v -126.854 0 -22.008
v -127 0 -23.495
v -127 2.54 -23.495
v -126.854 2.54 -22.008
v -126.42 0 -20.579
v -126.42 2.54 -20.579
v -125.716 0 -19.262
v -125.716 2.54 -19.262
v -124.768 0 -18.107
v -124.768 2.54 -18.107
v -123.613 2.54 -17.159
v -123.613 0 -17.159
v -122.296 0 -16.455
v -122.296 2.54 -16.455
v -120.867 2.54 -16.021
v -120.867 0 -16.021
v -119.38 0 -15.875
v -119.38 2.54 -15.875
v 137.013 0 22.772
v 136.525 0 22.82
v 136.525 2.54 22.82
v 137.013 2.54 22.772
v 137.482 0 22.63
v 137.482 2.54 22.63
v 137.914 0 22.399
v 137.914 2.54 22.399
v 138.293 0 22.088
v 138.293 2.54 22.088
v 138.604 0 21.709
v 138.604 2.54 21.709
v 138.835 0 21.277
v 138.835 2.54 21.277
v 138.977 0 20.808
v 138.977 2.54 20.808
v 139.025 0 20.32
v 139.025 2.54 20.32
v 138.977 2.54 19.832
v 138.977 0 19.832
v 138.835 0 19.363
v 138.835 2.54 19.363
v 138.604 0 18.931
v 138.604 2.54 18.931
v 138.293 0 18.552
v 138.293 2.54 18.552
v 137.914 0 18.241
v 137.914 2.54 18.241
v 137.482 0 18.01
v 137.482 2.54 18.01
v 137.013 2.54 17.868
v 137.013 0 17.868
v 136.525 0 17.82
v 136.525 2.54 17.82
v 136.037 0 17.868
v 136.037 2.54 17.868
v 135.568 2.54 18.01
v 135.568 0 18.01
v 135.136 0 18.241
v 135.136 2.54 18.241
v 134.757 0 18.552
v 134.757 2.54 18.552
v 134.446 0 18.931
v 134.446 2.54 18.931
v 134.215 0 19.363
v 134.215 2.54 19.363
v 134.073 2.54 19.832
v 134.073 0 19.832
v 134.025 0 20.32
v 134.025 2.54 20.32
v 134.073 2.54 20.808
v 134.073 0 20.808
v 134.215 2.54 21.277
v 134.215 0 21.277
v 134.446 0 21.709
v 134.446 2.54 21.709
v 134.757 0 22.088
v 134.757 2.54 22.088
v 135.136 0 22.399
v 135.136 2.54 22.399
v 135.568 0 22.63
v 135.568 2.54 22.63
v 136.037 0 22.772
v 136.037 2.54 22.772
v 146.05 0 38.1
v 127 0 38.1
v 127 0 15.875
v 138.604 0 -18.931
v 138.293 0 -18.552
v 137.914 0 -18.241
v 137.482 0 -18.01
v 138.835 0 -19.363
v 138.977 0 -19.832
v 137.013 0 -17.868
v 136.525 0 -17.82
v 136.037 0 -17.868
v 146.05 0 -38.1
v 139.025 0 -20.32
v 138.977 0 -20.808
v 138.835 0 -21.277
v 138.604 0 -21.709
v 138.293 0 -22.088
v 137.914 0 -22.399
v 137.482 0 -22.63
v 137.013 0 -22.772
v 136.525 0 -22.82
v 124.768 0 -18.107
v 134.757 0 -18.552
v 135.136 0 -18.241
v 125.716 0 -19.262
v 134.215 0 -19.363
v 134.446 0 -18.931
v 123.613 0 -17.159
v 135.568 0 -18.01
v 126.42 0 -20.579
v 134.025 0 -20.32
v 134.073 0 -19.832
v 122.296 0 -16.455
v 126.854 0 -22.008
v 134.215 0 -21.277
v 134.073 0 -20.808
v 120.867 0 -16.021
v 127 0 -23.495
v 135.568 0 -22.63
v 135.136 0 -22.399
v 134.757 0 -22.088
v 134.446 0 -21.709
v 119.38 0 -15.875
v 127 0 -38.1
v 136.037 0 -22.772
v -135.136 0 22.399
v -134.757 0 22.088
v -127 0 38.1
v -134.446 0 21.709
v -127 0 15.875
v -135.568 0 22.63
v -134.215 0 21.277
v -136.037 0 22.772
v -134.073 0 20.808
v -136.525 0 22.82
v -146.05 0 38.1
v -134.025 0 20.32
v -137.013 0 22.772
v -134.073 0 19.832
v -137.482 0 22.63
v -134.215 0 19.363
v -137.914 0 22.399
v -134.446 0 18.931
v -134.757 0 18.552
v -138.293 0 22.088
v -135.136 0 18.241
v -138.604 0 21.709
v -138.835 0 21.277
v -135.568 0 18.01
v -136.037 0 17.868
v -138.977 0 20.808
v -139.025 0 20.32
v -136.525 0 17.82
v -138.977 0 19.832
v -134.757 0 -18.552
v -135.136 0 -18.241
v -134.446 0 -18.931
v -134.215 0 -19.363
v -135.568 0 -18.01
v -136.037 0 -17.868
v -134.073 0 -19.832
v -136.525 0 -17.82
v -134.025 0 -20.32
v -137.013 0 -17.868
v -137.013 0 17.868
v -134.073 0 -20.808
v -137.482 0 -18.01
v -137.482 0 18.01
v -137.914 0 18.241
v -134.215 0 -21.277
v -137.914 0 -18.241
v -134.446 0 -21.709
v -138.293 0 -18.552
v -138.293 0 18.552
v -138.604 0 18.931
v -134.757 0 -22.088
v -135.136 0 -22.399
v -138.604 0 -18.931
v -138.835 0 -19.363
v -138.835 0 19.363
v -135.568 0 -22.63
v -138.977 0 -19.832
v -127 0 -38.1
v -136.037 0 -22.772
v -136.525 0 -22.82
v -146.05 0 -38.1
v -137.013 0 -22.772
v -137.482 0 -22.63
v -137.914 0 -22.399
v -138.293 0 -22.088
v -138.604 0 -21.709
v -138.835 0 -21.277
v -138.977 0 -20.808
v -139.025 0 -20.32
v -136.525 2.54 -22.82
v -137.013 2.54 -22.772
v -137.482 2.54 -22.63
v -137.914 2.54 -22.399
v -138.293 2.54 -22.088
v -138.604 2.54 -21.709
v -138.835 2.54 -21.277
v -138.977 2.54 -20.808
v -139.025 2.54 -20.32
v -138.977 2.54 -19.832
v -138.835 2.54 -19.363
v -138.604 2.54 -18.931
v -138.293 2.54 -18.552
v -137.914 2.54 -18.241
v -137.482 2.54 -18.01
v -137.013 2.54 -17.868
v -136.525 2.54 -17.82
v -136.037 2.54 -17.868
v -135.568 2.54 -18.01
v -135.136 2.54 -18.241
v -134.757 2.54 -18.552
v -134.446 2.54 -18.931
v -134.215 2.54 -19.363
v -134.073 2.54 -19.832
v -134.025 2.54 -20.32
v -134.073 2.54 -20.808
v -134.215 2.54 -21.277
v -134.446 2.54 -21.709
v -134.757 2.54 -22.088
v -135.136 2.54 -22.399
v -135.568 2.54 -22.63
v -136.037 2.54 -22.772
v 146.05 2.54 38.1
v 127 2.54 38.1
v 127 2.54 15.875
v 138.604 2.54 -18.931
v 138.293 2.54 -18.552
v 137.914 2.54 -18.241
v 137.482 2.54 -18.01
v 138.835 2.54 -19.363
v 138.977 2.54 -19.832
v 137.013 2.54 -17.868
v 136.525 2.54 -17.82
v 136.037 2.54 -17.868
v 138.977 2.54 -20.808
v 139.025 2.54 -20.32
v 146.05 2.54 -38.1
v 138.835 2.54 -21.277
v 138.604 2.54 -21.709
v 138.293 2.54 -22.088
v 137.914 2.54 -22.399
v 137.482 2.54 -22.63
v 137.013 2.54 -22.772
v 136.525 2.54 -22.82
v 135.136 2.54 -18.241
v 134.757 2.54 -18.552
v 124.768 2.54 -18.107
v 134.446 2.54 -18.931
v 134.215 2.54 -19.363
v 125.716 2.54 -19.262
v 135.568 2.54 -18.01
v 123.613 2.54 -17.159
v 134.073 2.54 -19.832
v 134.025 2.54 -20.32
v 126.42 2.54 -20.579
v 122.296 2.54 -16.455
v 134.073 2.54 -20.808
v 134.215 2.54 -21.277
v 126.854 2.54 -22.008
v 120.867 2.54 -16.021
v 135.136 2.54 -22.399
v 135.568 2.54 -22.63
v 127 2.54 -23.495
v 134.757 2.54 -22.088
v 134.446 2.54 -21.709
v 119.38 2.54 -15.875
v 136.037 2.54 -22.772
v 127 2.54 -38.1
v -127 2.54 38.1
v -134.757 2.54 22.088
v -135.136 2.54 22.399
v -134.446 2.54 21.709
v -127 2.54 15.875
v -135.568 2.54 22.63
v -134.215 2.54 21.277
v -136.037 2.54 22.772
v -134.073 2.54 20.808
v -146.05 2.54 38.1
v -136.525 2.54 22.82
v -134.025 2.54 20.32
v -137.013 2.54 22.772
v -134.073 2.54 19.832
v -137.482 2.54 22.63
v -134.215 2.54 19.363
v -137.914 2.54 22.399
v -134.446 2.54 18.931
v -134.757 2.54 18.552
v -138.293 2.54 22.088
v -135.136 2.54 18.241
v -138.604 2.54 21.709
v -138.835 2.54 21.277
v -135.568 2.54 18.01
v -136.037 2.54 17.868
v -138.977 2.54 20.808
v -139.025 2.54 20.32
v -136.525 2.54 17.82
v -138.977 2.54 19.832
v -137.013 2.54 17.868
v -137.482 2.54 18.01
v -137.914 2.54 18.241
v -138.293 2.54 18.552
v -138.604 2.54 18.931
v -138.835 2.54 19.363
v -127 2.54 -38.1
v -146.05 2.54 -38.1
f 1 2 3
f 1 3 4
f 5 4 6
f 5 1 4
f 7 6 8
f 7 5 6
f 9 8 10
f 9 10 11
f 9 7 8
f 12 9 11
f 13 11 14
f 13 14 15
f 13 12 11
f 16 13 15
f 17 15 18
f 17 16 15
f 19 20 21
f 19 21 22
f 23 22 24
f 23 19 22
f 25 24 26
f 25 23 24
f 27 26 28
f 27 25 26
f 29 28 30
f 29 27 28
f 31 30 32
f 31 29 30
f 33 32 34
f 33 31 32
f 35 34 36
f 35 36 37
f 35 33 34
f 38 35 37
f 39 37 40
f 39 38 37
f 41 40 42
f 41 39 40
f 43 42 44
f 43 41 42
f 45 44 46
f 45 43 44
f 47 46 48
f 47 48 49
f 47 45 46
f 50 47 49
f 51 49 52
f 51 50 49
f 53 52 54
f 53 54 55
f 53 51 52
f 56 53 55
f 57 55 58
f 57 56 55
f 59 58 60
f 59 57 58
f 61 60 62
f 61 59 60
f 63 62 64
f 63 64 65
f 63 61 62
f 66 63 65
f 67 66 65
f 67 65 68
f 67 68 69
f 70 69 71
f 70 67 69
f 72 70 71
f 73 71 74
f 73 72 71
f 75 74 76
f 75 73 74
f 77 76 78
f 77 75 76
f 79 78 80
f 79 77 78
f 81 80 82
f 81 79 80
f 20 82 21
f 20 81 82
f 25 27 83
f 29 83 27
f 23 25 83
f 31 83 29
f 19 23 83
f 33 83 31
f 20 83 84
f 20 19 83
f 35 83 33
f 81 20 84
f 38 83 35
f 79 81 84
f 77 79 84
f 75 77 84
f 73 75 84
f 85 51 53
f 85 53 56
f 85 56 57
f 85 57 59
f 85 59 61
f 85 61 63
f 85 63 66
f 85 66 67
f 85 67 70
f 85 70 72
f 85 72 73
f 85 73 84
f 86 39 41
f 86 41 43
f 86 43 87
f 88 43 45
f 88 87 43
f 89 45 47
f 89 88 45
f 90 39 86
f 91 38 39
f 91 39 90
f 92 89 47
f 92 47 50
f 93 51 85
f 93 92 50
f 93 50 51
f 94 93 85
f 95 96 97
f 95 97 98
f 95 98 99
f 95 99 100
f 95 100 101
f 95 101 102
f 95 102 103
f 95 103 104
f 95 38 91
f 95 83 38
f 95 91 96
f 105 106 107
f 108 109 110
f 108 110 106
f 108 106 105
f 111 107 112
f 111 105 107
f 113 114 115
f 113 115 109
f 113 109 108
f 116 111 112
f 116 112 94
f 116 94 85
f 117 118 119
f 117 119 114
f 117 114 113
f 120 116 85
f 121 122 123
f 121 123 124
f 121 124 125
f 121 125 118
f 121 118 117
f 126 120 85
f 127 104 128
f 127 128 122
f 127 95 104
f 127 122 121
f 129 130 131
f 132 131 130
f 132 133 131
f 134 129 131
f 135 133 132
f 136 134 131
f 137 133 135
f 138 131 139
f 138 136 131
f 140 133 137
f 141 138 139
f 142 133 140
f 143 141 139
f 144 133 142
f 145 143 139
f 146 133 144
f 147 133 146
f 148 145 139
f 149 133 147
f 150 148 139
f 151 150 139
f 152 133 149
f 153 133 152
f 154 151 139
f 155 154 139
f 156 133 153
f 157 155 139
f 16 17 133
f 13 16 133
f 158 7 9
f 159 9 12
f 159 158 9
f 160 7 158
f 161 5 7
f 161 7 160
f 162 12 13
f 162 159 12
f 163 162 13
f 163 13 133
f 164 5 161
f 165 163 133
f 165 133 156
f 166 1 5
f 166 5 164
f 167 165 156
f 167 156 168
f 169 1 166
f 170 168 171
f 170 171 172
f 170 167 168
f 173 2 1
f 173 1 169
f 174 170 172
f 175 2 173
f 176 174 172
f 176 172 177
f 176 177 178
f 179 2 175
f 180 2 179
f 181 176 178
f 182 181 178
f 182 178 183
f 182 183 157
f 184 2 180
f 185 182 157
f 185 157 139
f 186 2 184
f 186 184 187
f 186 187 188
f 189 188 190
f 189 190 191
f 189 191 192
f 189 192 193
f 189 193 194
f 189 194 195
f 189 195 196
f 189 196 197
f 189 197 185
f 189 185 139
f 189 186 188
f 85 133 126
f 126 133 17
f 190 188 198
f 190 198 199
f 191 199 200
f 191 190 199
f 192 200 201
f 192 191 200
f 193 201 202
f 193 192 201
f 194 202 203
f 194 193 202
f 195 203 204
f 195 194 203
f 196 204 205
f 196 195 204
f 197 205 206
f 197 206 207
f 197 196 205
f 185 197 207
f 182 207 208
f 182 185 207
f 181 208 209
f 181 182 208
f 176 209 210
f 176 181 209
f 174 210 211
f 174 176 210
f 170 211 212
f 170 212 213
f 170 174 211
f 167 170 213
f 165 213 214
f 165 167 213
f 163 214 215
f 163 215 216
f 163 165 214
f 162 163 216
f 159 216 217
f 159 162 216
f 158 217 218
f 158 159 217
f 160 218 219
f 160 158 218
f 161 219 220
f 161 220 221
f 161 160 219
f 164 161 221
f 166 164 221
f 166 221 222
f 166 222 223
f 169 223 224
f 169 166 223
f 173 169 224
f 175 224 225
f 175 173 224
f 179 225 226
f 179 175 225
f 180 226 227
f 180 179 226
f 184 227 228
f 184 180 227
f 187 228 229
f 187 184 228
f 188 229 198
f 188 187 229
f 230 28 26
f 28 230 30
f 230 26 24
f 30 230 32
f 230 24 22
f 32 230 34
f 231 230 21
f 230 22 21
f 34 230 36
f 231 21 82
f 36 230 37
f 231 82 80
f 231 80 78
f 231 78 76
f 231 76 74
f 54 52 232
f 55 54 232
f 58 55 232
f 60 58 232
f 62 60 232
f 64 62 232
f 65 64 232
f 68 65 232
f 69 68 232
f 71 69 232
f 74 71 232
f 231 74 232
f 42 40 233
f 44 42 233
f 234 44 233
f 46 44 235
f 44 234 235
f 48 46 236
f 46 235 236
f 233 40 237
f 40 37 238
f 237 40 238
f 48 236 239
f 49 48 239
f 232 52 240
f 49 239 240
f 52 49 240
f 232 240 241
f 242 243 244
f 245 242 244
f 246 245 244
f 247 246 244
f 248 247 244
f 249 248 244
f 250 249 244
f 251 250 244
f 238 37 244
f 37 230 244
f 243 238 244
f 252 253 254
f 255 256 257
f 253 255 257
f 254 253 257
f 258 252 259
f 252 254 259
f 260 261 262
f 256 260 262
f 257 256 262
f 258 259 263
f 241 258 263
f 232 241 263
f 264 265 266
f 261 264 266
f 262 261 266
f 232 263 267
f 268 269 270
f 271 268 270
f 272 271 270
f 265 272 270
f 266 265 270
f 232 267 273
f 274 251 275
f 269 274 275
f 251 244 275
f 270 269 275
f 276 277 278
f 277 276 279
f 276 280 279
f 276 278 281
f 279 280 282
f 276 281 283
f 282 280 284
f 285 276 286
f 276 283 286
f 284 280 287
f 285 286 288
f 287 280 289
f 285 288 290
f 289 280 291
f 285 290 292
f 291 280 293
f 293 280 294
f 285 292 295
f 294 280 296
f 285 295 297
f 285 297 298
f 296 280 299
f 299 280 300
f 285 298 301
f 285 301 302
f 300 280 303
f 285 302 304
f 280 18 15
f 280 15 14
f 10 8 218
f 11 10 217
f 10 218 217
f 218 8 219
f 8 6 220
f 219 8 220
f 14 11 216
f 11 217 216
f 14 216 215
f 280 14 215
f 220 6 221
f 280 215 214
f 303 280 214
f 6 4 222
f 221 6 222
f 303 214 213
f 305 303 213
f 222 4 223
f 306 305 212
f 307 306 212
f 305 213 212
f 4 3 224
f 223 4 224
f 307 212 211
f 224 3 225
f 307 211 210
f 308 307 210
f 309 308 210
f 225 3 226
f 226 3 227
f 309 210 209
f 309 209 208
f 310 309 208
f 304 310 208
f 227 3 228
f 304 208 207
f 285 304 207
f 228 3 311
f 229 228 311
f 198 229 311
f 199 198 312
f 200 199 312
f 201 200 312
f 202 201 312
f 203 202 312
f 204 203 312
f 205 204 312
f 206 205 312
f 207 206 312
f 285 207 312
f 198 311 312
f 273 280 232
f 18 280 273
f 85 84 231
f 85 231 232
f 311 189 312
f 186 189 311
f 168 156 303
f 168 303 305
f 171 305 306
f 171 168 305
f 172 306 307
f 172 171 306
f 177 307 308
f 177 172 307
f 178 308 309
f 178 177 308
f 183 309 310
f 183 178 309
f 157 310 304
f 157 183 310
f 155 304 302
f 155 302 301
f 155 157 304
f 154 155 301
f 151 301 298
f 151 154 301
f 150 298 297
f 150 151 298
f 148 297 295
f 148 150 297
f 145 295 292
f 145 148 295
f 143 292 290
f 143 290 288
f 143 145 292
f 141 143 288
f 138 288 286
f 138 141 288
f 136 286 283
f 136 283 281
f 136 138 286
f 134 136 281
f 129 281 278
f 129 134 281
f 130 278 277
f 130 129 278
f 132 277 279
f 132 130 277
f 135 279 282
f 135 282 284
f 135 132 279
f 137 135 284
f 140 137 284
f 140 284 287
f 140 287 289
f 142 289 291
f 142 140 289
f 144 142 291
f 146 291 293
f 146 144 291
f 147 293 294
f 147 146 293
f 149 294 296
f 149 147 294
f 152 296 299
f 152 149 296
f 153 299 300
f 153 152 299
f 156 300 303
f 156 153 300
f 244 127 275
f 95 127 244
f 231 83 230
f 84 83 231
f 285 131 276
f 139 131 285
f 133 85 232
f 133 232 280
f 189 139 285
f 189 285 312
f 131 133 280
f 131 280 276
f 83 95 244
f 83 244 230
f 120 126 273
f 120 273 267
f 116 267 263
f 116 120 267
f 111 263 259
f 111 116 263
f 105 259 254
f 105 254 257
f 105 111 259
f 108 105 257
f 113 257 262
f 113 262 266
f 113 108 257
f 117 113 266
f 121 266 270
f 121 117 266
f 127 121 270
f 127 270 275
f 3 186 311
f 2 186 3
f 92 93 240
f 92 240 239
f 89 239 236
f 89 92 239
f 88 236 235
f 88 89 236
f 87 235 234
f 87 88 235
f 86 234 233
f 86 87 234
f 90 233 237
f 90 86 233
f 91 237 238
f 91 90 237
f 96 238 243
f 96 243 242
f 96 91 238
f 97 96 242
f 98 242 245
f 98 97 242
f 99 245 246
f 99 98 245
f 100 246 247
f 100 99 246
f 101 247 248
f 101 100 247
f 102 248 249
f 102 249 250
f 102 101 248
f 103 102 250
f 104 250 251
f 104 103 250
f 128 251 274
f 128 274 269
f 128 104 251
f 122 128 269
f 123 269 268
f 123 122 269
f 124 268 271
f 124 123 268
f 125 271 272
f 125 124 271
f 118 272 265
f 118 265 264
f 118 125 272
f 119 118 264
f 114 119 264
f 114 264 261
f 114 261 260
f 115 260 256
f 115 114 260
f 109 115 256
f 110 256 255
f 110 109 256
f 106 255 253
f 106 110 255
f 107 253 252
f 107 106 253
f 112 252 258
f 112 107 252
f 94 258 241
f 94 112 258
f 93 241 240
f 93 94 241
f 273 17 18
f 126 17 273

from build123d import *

# Parameters (mm, degrees)
SKETCH1_R           = 2.5
BOSS_EXTRUDE1_DEPTH = 2.54


with BuildPart() as part:
    # Sketch1 → Boss-Extrude1 (new body)
    with BuildSketch(Plane(origin=(0, 0, 0), x_dir=(1, 0, 0), z_dir=(0, 1, 0))):
        with BuildLine():
            Line((-127, 38.1), (-127, 23.495))
            ThreePointArc((-127, 23.495), (-124.768153673, 18.106846327), (-119.38, 15.875))
            Line((-119.38, 15.875), (119.38, 15.875))
            ThreePointArc((119.38, 15.875), (124.768153673, 18.106846327), (127, 23.495))
            Line((127, 23.495), (127, 38.1))
            Line((127, 38.1), (146.05, 38.1))
            Line((146.05, 38.1), (146.05, -38.1))
            Line((146.05, -38.1), (127, -38.1))
            Line((127, -38.1), (127, -15.875))
            Line((127, -15.875), (-127, -15.875))
            Line((-127, -15.875), (-127, -38.1))
            Line((-127, -38.1), (-146.05, -38.1))
            Line((-146.05, -38.1), (-146.05, 38.1))
            Line((-146.05, 38.1), (-127, 38.1))
        make_face()
        with Locations(Location((136.525, 20.32, 0), (0, 0, 270))):
            Circle(SKETCH1_R, mode=Mode.SUBTRACT)
        with Locations(Location((136.525, -20.32, 0), (0, 0, 270))):
            Circle(SKETCH1_R, mode=Mode.SUBTRACT)
        with Locations(Location((-136.525, 20.32, 0), (0, 0, 90))):
            Circle(SKETCH1_R, mode=Mode.SUBTRACT)
        with Locations(Location((-136.525, -20.32, 0), (0, 0, 90))):
            Circle(SKETCH1_R, mode=Mode.SUBTRACT)
    extrude(amount=BOSS_EXTRUDE1_DEPTH)


solid = part.part
